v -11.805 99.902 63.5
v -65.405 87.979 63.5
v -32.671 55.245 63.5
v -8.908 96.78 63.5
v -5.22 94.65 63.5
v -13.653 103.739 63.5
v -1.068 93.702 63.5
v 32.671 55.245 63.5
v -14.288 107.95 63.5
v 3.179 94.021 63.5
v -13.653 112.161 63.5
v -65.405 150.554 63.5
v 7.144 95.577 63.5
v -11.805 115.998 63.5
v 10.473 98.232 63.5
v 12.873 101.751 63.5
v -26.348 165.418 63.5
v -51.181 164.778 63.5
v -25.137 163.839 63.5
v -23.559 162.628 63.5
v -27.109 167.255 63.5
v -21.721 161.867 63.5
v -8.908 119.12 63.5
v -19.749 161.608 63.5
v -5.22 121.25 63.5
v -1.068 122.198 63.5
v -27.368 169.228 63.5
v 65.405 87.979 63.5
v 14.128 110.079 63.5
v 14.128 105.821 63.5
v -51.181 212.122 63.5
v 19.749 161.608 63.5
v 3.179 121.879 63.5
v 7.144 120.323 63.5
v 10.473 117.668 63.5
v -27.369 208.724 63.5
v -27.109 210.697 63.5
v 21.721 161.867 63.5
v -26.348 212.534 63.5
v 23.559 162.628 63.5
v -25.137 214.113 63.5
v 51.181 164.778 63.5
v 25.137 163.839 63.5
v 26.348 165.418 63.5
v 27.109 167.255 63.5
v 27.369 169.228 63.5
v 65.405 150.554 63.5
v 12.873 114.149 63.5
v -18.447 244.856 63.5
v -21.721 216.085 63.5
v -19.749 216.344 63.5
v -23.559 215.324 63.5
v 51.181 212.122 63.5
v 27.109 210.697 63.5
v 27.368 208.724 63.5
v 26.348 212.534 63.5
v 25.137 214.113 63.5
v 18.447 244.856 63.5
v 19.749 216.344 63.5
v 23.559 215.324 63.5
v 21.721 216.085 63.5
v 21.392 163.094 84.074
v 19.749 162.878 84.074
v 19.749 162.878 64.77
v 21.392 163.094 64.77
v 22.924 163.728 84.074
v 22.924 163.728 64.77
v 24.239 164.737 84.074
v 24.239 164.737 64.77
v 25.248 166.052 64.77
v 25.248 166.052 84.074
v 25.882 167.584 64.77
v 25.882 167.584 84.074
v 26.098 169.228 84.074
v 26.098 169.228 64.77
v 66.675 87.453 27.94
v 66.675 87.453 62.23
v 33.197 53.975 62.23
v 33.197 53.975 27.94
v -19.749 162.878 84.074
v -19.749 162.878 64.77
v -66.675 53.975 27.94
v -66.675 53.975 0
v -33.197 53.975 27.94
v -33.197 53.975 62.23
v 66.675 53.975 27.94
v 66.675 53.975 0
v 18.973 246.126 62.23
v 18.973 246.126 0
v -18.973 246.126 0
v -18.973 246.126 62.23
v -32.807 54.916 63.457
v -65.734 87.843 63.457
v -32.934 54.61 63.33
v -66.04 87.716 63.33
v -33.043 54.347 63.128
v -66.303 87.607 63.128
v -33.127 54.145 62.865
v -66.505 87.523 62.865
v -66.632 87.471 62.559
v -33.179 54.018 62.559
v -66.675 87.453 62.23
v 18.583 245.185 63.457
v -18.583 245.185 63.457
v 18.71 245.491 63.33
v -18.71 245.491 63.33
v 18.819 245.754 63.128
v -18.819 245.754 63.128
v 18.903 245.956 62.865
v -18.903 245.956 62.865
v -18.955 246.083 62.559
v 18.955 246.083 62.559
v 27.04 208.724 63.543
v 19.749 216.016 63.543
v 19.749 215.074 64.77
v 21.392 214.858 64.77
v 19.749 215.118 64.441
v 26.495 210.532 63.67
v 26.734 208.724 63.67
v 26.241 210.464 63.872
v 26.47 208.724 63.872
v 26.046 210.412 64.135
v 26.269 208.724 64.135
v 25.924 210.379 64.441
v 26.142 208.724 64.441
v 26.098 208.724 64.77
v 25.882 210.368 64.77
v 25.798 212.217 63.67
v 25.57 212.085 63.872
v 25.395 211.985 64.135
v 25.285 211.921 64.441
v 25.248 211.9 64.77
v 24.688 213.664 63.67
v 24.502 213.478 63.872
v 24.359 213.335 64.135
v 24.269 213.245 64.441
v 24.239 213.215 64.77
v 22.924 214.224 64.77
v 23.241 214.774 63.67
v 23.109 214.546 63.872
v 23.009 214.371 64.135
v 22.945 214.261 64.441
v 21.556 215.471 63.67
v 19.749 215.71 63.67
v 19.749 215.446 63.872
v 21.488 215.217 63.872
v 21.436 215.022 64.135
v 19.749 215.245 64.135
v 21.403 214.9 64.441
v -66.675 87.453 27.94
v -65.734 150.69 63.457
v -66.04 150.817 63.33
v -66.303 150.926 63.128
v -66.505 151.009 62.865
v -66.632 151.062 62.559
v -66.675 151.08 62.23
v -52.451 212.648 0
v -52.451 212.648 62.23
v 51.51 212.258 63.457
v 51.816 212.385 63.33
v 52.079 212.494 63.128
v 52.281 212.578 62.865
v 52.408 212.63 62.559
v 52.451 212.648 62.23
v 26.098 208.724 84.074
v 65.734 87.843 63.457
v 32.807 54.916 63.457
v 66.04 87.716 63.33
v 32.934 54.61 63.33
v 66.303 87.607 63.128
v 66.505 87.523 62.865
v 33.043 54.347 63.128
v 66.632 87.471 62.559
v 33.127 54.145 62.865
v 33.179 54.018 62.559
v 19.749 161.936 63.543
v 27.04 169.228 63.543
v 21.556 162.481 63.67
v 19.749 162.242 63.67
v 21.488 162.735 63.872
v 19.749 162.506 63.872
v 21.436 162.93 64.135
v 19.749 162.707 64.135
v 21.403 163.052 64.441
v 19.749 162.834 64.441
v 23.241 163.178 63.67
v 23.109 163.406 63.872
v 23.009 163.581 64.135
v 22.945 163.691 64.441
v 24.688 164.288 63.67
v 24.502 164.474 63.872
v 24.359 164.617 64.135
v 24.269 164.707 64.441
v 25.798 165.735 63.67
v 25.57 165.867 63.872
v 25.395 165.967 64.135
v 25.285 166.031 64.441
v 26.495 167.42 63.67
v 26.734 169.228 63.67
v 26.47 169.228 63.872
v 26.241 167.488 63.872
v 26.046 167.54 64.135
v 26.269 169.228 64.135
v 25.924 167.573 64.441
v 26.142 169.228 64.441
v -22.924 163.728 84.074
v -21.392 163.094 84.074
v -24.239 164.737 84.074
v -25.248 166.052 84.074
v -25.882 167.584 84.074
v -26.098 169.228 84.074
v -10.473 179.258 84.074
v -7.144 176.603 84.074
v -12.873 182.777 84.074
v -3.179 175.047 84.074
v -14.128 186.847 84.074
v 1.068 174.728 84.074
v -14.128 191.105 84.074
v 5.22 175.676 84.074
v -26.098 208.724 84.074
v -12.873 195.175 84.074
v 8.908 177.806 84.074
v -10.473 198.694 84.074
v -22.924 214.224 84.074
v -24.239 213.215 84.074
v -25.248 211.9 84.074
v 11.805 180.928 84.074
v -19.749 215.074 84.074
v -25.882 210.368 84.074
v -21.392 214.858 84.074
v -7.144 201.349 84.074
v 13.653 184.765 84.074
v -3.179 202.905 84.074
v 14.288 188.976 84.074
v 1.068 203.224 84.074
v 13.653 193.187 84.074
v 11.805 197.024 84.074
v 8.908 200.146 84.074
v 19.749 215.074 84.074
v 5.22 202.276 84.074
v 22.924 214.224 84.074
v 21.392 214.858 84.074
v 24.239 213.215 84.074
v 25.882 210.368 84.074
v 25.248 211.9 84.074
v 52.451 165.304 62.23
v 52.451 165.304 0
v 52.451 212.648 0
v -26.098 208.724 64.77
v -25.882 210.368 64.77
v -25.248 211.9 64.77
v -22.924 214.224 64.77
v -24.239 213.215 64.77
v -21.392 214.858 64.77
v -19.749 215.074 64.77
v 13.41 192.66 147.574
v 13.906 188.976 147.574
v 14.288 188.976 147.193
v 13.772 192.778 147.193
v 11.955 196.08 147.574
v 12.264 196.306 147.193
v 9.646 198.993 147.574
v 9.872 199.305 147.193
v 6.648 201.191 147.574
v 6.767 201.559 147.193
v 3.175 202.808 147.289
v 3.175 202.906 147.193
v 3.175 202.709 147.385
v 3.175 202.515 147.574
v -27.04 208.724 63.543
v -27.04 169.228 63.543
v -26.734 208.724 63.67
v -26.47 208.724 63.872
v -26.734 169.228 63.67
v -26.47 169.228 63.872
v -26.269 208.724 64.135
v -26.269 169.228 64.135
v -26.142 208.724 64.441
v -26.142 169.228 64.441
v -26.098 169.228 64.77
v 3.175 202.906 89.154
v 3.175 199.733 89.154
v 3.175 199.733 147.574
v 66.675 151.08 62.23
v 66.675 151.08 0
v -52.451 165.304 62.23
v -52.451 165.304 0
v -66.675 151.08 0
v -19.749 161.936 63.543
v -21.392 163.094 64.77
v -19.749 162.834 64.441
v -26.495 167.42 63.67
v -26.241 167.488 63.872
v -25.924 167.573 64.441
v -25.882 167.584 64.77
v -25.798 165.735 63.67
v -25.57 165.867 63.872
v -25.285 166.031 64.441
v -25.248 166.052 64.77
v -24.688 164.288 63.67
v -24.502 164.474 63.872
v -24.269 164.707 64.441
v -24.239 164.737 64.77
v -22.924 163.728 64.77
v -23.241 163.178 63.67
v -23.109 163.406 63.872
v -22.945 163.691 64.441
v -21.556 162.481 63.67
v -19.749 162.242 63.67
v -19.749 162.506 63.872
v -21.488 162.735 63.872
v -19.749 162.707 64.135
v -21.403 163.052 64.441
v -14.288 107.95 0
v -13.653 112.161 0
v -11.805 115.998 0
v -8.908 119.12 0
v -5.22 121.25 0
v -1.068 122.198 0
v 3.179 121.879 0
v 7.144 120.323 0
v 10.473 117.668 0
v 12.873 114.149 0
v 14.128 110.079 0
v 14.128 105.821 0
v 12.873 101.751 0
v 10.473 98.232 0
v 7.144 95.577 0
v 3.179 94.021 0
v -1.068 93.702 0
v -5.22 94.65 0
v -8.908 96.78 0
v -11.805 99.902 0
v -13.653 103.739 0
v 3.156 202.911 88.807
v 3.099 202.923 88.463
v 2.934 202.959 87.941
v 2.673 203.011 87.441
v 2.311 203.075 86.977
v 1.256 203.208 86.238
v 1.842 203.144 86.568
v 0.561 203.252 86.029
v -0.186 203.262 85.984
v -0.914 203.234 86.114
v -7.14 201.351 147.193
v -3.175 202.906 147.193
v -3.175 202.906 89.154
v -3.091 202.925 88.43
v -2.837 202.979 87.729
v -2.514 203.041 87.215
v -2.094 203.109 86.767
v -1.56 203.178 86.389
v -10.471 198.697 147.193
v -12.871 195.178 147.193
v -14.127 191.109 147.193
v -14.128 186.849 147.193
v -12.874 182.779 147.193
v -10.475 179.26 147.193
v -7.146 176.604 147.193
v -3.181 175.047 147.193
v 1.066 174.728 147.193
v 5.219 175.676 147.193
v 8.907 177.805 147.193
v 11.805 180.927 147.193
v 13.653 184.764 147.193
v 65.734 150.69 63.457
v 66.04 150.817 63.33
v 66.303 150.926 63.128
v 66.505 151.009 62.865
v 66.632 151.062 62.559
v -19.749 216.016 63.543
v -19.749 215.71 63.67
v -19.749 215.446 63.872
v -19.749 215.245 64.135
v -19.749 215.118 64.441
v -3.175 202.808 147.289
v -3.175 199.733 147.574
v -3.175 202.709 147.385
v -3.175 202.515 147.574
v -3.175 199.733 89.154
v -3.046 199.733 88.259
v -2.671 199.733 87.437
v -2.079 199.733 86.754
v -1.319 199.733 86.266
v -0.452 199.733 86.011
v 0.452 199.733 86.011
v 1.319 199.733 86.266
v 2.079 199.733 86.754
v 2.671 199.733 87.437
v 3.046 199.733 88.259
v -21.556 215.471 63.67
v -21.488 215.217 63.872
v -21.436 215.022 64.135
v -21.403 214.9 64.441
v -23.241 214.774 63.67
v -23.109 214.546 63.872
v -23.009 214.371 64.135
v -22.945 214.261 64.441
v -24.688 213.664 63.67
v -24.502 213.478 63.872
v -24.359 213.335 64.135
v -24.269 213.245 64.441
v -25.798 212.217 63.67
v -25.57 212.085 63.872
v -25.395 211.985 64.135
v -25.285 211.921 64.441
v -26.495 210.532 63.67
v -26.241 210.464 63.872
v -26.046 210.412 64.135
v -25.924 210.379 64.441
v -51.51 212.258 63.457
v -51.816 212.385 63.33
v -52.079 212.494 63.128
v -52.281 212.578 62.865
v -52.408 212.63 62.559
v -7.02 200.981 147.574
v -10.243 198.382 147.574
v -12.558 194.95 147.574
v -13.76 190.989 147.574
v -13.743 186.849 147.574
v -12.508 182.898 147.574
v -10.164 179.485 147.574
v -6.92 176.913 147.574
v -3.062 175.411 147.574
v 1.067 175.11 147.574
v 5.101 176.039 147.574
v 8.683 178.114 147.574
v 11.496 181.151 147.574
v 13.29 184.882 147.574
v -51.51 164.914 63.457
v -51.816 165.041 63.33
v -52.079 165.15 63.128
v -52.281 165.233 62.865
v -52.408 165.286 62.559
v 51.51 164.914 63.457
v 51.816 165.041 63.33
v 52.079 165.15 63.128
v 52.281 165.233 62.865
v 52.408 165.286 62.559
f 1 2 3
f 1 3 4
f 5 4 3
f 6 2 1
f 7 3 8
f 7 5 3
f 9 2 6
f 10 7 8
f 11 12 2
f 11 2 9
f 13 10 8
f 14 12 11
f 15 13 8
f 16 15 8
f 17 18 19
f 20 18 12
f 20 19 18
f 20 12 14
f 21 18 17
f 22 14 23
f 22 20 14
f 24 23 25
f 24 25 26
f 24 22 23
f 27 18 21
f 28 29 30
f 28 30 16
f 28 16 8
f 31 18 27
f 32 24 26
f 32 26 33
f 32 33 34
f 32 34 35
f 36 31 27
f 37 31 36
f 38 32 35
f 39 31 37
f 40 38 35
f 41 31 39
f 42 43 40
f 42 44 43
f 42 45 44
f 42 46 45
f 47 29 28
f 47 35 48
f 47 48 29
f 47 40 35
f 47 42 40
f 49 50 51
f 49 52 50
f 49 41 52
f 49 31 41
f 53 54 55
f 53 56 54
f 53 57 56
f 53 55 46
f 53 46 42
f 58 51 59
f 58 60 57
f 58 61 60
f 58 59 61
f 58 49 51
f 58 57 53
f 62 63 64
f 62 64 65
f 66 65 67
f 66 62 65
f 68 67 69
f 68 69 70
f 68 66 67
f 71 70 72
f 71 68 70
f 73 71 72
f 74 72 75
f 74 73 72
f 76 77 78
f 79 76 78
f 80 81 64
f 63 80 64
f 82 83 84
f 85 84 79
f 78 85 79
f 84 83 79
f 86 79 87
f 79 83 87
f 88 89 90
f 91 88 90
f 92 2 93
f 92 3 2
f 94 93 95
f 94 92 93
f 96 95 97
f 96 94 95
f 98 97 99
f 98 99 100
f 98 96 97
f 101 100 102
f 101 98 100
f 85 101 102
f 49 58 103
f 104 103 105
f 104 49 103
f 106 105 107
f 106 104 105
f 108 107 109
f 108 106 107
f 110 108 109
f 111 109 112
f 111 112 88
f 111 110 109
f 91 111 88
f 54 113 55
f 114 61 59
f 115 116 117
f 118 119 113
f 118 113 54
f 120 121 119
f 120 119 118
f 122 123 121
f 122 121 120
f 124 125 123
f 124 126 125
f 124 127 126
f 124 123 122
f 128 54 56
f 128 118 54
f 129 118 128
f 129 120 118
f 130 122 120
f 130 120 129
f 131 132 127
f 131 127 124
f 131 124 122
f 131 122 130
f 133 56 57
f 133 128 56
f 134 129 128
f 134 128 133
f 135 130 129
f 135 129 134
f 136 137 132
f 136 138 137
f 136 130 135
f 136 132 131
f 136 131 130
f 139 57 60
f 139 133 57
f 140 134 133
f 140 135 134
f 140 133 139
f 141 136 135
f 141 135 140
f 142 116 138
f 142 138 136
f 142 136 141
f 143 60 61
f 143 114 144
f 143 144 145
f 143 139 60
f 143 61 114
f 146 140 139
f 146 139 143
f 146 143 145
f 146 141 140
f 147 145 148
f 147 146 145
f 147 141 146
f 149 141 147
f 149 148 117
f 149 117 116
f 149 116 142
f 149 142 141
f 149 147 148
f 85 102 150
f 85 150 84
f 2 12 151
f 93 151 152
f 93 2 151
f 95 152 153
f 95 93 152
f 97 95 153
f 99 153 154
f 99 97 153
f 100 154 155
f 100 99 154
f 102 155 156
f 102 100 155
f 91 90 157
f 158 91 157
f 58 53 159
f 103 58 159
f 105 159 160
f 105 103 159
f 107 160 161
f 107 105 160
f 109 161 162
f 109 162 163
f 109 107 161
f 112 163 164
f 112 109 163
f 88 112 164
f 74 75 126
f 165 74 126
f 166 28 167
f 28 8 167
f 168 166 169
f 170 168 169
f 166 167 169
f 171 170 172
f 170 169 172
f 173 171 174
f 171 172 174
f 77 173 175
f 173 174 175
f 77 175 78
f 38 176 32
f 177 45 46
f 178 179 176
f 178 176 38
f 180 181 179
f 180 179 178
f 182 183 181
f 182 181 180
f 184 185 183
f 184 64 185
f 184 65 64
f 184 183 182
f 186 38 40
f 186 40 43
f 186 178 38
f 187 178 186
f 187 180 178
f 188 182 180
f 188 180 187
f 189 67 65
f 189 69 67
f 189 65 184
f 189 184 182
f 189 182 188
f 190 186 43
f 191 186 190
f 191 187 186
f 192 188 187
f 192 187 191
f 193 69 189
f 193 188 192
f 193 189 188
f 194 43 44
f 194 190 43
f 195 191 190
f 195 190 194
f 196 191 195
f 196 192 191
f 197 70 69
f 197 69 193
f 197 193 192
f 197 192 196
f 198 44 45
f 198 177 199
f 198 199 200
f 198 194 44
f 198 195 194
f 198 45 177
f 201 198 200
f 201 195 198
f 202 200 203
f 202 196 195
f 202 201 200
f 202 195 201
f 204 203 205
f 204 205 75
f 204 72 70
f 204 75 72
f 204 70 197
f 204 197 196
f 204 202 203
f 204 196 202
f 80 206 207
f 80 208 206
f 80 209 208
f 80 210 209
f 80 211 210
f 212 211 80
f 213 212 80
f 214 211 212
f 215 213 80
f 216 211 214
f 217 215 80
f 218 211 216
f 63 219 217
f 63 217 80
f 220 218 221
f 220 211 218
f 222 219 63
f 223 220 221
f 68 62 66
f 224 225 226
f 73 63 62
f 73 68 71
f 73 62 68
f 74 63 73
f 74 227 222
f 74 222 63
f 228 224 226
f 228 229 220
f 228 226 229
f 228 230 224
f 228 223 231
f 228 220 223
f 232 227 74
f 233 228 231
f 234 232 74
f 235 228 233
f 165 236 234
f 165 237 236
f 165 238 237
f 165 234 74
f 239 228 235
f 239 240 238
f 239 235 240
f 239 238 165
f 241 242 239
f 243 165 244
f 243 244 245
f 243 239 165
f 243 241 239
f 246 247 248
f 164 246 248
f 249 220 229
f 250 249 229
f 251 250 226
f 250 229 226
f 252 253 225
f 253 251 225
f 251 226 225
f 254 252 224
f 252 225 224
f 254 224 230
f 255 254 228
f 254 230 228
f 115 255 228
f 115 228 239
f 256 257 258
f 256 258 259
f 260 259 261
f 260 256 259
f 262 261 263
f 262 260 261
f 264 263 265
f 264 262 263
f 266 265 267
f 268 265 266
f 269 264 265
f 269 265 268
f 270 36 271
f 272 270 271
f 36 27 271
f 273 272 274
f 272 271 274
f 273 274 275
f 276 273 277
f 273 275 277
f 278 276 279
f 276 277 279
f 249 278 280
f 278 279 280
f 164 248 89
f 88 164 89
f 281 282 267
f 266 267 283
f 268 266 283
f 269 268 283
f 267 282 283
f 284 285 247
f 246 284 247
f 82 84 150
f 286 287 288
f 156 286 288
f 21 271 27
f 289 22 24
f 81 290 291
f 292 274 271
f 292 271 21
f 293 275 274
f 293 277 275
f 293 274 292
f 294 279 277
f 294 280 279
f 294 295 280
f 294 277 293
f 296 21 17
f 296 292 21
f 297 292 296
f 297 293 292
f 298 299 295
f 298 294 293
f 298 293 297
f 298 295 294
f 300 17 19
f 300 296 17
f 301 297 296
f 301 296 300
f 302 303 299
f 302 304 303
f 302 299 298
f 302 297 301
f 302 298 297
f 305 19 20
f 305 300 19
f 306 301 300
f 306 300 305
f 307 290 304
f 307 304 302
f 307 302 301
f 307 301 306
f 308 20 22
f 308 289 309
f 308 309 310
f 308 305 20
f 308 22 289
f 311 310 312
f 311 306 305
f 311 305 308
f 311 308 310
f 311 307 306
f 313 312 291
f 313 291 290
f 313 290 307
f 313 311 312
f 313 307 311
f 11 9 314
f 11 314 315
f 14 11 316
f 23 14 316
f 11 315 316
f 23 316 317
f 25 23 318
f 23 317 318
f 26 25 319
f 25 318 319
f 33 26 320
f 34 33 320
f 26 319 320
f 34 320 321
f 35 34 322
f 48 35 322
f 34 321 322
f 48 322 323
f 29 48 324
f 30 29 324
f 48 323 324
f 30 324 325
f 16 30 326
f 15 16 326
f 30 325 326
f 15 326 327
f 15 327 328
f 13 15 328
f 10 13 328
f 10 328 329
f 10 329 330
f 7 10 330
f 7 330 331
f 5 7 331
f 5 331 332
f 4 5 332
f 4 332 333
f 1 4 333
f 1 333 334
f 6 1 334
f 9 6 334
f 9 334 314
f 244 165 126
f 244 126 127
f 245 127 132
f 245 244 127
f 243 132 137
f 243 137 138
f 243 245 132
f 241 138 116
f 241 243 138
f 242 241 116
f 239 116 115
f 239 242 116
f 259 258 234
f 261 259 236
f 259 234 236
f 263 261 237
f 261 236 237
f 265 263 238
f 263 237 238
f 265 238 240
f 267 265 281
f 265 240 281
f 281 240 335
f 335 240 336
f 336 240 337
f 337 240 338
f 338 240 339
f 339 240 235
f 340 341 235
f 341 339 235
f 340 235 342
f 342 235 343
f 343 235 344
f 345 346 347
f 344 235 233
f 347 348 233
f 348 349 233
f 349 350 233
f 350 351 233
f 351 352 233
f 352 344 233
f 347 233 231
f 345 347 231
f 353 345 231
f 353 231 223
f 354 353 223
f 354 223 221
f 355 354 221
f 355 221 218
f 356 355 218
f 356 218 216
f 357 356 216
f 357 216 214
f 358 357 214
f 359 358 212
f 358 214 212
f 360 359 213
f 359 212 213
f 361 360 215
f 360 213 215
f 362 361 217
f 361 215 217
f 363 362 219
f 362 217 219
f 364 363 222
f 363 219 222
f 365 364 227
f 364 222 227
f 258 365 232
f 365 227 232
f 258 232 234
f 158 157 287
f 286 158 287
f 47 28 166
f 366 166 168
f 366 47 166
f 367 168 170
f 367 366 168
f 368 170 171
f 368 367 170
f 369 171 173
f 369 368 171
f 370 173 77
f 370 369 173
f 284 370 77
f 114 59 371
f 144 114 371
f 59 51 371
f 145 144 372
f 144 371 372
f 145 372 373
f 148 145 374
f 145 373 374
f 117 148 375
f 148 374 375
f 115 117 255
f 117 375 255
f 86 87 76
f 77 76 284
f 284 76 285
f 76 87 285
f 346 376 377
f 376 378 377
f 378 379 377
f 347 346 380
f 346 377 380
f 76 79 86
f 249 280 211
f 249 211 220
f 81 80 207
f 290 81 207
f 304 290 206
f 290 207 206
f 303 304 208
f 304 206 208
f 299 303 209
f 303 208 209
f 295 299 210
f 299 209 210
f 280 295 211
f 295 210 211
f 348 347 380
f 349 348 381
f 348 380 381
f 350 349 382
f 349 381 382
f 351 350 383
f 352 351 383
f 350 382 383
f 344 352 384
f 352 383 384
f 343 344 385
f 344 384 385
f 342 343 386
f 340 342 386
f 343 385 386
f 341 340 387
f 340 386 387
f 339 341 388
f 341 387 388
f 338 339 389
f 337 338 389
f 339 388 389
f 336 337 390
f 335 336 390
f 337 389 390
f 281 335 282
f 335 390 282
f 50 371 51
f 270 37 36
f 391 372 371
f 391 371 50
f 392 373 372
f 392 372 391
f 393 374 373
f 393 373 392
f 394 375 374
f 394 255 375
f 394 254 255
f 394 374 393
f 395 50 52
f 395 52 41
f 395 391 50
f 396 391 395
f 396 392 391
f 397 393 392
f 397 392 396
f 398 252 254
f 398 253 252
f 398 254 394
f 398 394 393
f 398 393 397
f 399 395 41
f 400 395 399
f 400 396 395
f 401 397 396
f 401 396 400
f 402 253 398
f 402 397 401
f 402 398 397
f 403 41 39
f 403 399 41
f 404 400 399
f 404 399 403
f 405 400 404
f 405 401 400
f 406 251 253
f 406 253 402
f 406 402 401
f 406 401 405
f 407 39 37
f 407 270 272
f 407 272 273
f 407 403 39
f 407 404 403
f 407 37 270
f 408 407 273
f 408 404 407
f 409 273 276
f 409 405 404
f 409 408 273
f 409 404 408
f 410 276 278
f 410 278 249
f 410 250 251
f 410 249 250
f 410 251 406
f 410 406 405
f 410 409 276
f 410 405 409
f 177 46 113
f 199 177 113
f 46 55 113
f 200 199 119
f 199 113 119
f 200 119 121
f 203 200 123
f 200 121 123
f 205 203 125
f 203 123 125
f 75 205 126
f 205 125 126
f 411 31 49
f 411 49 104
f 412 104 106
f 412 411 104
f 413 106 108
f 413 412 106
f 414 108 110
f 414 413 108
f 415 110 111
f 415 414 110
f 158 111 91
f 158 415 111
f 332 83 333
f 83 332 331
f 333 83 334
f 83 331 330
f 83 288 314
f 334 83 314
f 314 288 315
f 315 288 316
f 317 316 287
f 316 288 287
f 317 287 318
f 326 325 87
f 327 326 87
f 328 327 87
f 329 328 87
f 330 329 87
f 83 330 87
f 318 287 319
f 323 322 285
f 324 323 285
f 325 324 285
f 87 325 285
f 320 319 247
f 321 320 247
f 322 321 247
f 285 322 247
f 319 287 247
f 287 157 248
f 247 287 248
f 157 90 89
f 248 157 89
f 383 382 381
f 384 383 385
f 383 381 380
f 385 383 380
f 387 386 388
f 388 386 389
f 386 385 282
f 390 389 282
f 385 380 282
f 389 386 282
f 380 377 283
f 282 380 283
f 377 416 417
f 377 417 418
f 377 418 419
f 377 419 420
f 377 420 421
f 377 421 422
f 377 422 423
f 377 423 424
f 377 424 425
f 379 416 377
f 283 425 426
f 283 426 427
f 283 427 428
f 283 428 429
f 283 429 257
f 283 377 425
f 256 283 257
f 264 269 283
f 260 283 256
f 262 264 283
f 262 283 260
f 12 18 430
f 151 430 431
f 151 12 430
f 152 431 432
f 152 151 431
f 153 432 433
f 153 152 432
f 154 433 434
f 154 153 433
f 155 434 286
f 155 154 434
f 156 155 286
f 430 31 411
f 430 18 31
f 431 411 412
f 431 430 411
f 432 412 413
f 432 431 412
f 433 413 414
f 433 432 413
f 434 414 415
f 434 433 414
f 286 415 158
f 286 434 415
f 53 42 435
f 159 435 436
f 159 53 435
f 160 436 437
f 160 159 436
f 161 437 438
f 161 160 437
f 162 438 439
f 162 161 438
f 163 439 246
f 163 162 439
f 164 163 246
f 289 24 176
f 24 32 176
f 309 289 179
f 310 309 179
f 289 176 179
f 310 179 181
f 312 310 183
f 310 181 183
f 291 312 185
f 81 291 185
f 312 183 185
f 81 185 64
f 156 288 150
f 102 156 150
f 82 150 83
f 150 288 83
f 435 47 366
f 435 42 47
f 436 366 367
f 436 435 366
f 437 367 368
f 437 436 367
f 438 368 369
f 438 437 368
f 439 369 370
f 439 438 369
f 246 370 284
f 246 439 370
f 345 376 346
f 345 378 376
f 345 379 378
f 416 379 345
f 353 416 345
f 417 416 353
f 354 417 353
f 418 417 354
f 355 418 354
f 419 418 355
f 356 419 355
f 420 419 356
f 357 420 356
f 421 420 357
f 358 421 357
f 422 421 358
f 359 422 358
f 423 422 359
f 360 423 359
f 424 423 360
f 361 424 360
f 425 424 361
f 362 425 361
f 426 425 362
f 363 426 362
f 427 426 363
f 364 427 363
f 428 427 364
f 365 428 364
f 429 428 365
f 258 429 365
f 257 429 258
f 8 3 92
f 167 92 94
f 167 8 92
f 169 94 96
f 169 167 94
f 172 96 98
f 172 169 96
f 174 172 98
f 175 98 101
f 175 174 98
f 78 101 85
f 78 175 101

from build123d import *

# Parameters (mm, degrees)
BOSS_EXTRUDE1_DEPTH = 63.5
SKETCH3_W           = 52.197
SKETCH3_H           = 52.197
BOSS_EXTRUDE2_DEPTH = 20.574
SKETCH_D_R          = 14.2875
BOSS_EXTRUDE3_DEPTH = 63.5
CUT_EXTRUDE1_DEPTH  = 35.56
FILLET1_R           = 6.35
FILLET2_R           = 1.27
KEYWAY_START        = 10.7569
KEYWAY_DEPTH        = 47.3931
CHAMFER1_SIZE       = 0.381
SKETCH7_R           = 14.2875
CUT_EXTRUDE3_DEPTH  = 148.574


with BuildPart() as part:
    # L,M → Boss-Extrude1 (new body)
    with BuildSketch(Plane.XY):
        Polygon((-66.675, 53.975), (66.675, 53.975), (66.675, 151.07969491), (52.451, 165.30369491), (52.451, 212.64830509), (18.97330509, 246.126), (-18.97330509, 246.126), (-52.451, 212.64830509), (-52.451, 165.30369491), (-66.675, 151.07969491), align=None)
    extrude(amount=BOSS_EXTRUDE1_DEPTH)

    # Sketch3 → Boss-Extrude2 (add)
    with BuildSketch(Plane.XY.offset(63.5)):
        with Locations((0, 188.976)):
            Rectangle(SKETCH3_W, SKETCH3_H)
    extrude(amount=BOSS_EXTRUDE2_DEPTH)

    # D → Boss-Extrude3 (add)
    with BuildSketch(Plane.XY.offset(84.074)):
        with Locations((0, 188.976)):
            Circle(SKETCH_D_R)
    extrude(amount=BOSS_EXTRUDE3_DEPTH)

    # Sketch5 → Cut-Extrude1 (cut)
    with BuildSketch(Plane.XY.offset(63.5)):
        Polygon((66.675, 87.45269491), (33.19730509, 53.975), (66.675, 53.975), align=None)
        Polygon((-66.675, 53.975), (-66.675, 87.45269491), (-33.19730509, 53.975), align=None)
    extrude(amount=-CUT_EXTRUDE1_DEPTH, mode=Mode.SUBTRACT)

    # Fillet1
    fillet1_edges = [part.edges().sort_by_distance(p)[0] for p in [
        (-26.0985, 215.0745, 73.787),
        (-26.0985, 162.8775, 73.787),
        (26.0985, 162.8775, 73.787),
        (26.0985, 215.0745, 73.787),
    ]]
    fillet(fillet1_edges, radius=FILLET1_R)

    # Fillet2
    fillet2_edges = [part.edges().sort_by_distance(p)[0] for p in [
        (66.675, 119.26619491, 63.5),
        (49.936152545, 70.713847455, 63.5),
        (59.563, 158.19169491, 63.5),
        (52.451, 188.976, 63.5),
        (35.712152545, 229.387152545, 63.5),
        (0, 53.975, 63.5),
        (0, 246.126, 63.5),
        (-35.712152545, 229.387152545, 63.5),
        (-52.451, 188.976, 63.5),
        (-59.563, 158.19169491, 63.5),
        (-66.675, 119.26619491, 63.5),
        (-49.936152545, 70.713847455, 63.5),
        (0, 162.8775, 63.5),
        (-26.0985, 188.976, 63.5),
        (26.0985, 188.976, 63.5),
        (0, 215.0745, 63.5),
        (-24.238628061, 164.737371939, 63.5),
        (24.238628061, 164.737371939, 63.5),
        (-24.238628061, 213.214628061, 63.5),
        (24.238628061, 213.214628061, 63.5),
    ]]
    fillet(fillet2_edges, radius=FILLET2_R)

    # Sketch6 → Keyway (cut, through all)
    with BuildSketch(Plane(origin=(0, 188.976, 0), x_dir=(-1, 0, 0), z_dir=(0, 1, 0)).offset(KEYWAY_START)):
        with BuildLine():
            Line((3.175, 147.574), (3.175, 89.154))
            ThreePointArc((3.175, 89.154), (0, 85.979), (-3.175, 89.154))
            Line((-3.175, 89.154), (-3.175, 147.574))
            ThreePointArc((-3.175, 147.574), (0, 150.749), (3.175, 147.574))
        make_face()
    extrude(amount=KEYWAY_DEPTH, mode=Mode.SUBTRACT)

    # Chamfer1
    chamfer1_edges = [part.edges().sort_by_distance(p)[0] for p in [
        (-8.909821652, 177.806947472, 147.574),
    ]]
    chamfer(chamfer1_edges, length=CHAMFER1_SIZE)

    # Sketch7 → Cut-Extrude3 (cut, through all)
    with BuildSketch(Plane(origin=(0, 0, 0), x_dir=(-1, 0, 0), z_dir=(0, 0, -1))):
        with Locations((0, 107.95)):
            Circle(SKETCH7_R)
    extrude(amount=-CUT_EXTRUDE3_DEPTH, mode=Mode.SUBTRACT)


solid = part.part
